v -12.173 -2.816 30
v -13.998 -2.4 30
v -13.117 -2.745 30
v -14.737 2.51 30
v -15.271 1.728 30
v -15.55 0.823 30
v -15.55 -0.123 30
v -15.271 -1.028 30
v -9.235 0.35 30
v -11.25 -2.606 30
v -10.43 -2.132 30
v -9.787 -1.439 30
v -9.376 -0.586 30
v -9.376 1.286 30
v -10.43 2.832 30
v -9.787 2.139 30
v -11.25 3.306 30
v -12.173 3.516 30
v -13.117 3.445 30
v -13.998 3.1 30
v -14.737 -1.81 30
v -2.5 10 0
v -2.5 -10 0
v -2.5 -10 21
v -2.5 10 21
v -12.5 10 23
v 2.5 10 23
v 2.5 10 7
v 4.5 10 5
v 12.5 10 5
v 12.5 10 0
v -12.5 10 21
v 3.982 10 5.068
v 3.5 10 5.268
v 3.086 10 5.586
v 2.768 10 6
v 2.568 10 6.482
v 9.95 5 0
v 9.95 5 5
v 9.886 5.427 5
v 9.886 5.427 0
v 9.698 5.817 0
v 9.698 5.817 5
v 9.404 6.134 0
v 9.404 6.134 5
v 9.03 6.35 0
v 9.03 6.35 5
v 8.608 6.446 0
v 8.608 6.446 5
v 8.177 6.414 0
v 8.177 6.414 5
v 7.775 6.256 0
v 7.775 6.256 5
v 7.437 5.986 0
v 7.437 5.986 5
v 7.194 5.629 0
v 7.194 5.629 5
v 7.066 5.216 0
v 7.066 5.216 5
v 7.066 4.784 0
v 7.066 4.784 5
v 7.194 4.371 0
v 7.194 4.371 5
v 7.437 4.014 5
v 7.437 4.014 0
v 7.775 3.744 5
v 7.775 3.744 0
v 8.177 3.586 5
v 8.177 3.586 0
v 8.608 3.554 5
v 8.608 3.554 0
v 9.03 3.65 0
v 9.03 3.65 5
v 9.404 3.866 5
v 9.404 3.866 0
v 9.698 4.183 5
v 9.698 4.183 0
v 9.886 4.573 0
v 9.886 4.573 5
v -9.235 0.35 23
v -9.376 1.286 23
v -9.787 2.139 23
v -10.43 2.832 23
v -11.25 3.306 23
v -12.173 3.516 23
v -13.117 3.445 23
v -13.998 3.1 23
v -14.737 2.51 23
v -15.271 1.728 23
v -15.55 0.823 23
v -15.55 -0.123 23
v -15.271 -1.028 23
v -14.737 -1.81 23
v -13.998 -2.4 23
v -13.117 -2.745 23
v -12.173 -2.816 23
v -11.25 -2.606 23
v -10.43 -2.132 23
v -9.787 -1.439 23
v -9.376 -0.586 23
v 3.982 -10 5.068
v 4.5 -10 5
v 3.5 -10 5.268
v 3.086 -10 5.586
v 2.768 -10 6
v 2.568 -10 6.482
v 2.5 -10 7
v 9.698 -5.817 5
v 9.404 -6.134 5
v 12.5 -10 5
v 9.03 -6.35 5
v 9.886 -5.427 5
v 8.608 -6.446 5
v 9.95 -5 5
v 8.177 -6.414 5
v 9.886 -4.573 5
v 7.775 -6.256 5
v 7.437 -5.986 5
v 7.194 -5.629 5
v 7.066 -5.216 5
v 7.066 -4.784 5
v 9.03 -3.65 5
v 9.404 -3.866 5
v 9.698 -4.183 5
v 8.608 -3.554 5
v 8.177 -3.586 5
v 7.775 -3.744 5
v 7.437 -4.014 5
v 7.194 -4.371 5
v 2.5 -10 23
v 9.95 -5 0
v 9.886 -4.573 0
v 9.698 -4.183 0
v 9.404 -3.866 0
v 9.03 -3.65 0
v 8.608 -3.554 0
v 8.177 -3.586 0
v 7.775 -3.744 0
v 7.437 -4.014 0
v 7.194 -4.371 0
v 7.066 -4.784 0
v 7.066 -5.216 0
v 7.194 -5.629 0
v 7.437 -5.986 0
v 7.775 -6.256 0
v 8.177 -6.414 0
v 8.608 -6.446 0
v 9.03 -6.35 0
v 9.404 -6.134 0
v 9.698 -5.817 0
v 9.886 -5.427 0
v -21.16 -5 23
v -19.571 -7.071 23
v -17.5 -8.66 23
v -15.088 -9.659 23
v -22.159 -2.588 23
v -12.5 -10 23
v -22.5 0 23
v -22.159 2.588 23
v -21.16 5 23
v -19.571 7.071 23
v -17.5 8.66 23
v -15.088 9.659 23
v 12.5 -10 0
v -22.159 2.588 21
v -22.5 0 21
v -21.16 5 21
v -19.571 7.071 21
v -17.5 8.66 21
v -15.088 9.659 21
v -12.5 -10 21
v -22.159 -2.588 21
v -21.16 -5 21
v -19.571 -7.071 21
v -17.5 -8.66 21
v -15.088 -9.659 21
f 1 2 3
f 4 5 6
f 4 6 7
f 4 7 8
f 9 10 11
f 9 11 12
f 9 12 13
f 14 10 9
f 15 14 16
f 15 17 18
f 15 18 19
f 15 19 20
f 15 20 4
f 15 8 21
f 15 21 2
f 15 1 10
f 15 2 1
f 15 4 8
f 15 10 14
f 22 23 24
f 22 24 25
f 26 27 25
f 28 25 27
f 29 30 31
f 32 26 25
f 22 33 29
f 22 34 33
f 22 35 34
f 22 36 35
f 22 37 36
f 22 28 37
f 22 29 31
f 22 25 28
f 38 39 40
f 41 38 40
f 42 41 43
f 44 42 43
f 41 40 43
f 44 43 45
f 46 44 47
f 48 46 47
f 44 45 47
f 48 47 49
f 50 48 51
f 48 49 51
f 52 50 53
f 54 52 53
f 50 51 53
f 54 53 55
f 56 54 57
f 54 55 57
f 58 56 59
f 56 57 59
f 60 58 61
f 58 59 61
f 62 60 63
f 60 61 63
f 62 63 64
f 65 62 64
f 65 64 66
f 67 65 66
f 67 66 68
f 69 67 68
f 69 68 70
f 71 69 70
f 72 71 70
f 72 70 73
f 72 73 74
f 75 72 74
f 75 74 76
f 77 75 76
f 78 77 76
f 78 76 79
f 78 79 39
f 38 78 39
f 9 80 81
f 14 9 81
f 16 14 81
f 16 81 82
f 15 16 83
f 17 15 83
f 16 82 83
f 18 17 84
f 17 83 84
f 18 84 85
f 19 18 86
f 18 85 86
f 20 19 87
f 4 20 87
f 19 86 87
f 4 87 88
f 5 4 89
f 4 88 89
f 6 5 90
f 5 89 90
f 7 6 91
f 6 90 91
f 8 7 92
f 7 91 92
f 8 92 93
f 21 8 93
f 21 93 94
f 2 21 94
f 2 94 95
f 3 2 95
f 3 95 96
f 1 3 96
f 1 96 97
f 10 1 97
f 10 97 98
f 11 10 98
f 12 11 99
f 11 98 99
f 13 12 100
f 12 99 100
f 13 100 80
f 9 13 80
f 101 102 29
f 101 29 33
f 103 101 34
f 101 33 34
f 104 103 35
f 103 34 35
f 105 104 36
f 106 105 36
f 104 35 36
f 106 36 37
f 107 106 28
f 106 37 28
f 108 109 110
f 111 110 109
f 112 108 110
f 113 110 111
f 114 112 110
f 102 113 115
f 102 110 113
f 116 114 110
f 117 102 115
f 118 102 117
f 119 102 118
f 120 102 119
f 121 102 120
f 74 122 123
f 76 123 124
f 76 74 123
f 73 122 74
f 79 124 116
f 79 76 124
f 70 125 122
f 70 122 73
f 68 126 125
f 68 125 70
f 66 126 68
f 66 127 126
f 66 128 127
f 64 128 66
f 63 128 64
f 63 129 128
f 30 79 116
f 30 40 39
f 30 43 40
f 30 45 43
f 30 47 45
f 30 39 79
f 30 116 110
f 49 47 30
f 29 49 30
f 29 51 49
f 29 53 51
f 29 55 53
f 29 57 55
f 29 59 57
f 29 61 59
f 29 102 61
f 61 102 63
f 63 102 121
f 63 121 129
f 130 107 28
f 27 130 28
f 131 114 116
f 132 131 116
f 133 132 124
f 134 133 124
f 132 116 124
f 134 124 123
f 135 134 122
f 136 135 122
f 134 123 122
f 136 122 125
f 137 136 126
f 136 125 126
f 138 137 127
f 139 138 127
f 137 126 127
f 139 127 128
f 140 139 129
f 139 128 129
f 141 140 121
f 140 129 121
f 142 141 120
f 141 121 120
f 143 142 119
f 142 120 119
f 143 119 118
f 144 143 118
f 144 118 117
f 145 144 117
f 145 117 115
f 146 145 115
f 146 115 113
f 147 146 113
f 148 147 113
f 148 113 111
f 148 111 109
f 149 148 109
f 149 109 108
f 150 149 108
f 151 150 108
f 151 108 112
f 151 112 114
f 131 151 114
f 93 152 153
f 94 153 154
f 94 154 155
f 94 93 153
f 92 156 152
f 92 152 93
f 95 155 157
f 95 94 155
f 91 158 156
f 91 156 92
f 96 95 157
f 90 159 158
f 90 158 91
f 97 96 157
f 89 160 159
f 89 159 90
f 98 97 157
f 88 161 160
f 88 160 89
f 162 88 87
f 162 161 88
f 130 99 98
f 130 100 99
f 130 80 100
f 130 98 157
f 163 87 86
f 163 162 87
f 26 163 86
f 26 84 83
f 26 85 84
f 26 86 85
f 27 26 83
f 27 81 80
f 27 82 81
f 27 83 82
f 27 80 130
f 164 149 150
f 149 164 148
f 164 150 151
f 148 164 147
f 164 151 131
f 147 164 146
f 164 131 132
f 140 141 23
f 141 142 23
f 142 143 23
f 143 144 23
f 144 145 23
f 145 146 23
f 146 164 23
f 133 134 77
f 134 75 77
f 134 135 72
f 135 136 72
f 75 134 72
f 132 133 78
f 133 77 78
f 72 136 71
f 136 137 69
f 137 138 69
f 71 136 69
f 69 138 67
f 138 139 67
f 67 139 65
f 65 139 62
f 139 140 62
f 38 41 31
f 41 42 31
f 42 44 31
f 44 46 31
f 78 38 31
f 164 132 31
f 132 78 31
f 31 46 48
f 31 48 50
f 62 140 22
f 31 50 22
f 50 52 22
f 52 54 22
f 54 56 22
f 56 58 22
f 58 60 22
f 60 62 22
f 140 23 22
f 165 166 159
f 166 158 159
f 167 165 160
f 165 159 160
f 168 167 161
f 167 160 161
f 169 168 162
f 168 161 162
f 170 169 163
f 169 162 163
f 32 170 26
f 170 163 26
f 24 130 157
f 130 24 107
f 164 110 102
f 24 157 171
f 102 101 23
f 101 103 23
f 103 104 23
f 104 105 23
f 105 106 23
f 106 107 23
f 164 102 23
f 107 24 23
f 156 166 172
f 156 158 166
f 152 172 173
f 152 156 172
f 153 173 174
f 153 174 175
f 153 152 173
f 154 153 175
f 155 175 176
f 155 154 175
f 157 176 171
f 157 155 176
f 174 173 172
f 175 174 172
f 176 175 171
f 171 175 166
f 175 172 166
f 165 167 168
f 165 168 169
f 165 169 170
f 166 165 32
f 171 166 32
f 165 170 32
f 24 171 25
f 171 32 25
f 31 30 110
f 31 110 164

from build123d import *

# Parameters (mm, degrees)
ESQUISSE1_W             = 5
ESQUISSE1_H             = 20
BOSS_EXTRU_1_DEPTH      = 21
ESQUISSE2_W             = 25
ESQUISSE2_H             = 20
BOSS_EXTRU_2_DEPTH      = 2
ESQUISSE3_R             = 3.175
BOSS_EXTRU_3_DEPTH      = 7
CONG_1_R                = 10
ESQUISSE5_W             = 5
ESQUISSE5_H             = 20
BOSS_EXTRU_4_DEPTH      = 10
CONG_2_R                = 2
ENL_V_MAT_EXTRU_1_REACH = 37.089
ESQUISSE6_R             = 1.45


with BuildPart() as part:
    # Esquisse1 → Boss.-Extru.1 (new body)
    with BuildSketch(Plane.XY):
        Rectangle(ESQUISSE1_W, ESQUISSE1_H)
    extrude(amount=BOSS_EXTRU_1_DEPTH)

    # Esquisse2 → Boss.-Extru.2 (add)
    with BuildSketch(Plane.XY.offset(21)):
        with Locations((-10, 0)):
            Rectangle(ESQUISSE2_W, ESQUISSE2_H)
    extrude(amount=BOSS_EXTRU_2_DEPTH)

    # Esquisse3 → Boss.-Extru.3 (add)
    with BuildSketch(Plane.XY.offset(23)):
        with Locations((-12.41, 0.35)):
            Circle(ESQUISSE3_R)
    extrude(amount=BOSS_EXTRU_3_DEPTH)

    # Congé1
    cong_1_edges = [part.edges().sort_by_distance(p)[0] for p in [
        (-22.5, 10, 22),
        (-22.5, -10, 22),
    ]]
    fillet(cong_1_edges, radius=CONG_1_R - 0.0001)  # a hair under: the kernel refuses the full size

    # Esquisse5 → Boss.-Extru.4 (add)
    with BuildSketch(Plane(origin=(2.5, 0, 0), x_dir=(0, 0, -1), z_dir=(1, 0, 0))):
        with Locations((-2.5, 0)):
            Rectangle(ESQUISSE5_W, ESQUISSE5_H)
    extrude(amount=BOSS_EXTRU_4_DEPTH)

    # Congé2
    cong_2_edges = [part.edges().sort_by_distance(p)[0] for p in [
        (2.5, 0, 5),
    ]]
    fillet(cong_2_edges, radius=CONG_2_R)

    # Esquisse6 → Enlèv. mat.-Extru.1 (cut, up to next)
    with BuildSketch(Plane.XY.offset(5), mode=Mode.PRIVATE) as enl_v_mat_extru_1_sk1:
        with Locations((8.5, 5)):
            Circle(ESQUISSE6_R)
    enl_v_mat_extru_1_tool1 = extrude(enl_v_mat_extru_1_sk1.sketch, amount=-ENL_V_MAT_EXTRU_1_REACH, mode=Mode.PRIVATE) & part.part
    # Esquisse6 → Enlèv. mat.-Extru.1 (cut, up to next)
    with BuildSketch(Plane.XY.offset(5), mode=Mode.PRIVATE) as enl_v_mat_extru_1_sk2:
        with Locations((8.5, -5)):
            Circle(ESQUISSE6_R)
    enl_v_mat_extru_1_tool2 = extrude(enl_v_mat_extru_1_sk2.sketch, amount=-ENL_V_MAT_EXTRU_1_REACH, mode=Mode.PRIVATE) & part.part
    add(enl_v_mat_extru_1_tool1.solids().sort_by_distance((8.5, 5, 5))[0], mode=Mode.SUBTRACT)
    add(enl_v_mat_extru_1_tool2.solids().sort_by_distance((8.5, -5, 5))[0], mode=Mode.SUBTRACT)


solid = part.part
